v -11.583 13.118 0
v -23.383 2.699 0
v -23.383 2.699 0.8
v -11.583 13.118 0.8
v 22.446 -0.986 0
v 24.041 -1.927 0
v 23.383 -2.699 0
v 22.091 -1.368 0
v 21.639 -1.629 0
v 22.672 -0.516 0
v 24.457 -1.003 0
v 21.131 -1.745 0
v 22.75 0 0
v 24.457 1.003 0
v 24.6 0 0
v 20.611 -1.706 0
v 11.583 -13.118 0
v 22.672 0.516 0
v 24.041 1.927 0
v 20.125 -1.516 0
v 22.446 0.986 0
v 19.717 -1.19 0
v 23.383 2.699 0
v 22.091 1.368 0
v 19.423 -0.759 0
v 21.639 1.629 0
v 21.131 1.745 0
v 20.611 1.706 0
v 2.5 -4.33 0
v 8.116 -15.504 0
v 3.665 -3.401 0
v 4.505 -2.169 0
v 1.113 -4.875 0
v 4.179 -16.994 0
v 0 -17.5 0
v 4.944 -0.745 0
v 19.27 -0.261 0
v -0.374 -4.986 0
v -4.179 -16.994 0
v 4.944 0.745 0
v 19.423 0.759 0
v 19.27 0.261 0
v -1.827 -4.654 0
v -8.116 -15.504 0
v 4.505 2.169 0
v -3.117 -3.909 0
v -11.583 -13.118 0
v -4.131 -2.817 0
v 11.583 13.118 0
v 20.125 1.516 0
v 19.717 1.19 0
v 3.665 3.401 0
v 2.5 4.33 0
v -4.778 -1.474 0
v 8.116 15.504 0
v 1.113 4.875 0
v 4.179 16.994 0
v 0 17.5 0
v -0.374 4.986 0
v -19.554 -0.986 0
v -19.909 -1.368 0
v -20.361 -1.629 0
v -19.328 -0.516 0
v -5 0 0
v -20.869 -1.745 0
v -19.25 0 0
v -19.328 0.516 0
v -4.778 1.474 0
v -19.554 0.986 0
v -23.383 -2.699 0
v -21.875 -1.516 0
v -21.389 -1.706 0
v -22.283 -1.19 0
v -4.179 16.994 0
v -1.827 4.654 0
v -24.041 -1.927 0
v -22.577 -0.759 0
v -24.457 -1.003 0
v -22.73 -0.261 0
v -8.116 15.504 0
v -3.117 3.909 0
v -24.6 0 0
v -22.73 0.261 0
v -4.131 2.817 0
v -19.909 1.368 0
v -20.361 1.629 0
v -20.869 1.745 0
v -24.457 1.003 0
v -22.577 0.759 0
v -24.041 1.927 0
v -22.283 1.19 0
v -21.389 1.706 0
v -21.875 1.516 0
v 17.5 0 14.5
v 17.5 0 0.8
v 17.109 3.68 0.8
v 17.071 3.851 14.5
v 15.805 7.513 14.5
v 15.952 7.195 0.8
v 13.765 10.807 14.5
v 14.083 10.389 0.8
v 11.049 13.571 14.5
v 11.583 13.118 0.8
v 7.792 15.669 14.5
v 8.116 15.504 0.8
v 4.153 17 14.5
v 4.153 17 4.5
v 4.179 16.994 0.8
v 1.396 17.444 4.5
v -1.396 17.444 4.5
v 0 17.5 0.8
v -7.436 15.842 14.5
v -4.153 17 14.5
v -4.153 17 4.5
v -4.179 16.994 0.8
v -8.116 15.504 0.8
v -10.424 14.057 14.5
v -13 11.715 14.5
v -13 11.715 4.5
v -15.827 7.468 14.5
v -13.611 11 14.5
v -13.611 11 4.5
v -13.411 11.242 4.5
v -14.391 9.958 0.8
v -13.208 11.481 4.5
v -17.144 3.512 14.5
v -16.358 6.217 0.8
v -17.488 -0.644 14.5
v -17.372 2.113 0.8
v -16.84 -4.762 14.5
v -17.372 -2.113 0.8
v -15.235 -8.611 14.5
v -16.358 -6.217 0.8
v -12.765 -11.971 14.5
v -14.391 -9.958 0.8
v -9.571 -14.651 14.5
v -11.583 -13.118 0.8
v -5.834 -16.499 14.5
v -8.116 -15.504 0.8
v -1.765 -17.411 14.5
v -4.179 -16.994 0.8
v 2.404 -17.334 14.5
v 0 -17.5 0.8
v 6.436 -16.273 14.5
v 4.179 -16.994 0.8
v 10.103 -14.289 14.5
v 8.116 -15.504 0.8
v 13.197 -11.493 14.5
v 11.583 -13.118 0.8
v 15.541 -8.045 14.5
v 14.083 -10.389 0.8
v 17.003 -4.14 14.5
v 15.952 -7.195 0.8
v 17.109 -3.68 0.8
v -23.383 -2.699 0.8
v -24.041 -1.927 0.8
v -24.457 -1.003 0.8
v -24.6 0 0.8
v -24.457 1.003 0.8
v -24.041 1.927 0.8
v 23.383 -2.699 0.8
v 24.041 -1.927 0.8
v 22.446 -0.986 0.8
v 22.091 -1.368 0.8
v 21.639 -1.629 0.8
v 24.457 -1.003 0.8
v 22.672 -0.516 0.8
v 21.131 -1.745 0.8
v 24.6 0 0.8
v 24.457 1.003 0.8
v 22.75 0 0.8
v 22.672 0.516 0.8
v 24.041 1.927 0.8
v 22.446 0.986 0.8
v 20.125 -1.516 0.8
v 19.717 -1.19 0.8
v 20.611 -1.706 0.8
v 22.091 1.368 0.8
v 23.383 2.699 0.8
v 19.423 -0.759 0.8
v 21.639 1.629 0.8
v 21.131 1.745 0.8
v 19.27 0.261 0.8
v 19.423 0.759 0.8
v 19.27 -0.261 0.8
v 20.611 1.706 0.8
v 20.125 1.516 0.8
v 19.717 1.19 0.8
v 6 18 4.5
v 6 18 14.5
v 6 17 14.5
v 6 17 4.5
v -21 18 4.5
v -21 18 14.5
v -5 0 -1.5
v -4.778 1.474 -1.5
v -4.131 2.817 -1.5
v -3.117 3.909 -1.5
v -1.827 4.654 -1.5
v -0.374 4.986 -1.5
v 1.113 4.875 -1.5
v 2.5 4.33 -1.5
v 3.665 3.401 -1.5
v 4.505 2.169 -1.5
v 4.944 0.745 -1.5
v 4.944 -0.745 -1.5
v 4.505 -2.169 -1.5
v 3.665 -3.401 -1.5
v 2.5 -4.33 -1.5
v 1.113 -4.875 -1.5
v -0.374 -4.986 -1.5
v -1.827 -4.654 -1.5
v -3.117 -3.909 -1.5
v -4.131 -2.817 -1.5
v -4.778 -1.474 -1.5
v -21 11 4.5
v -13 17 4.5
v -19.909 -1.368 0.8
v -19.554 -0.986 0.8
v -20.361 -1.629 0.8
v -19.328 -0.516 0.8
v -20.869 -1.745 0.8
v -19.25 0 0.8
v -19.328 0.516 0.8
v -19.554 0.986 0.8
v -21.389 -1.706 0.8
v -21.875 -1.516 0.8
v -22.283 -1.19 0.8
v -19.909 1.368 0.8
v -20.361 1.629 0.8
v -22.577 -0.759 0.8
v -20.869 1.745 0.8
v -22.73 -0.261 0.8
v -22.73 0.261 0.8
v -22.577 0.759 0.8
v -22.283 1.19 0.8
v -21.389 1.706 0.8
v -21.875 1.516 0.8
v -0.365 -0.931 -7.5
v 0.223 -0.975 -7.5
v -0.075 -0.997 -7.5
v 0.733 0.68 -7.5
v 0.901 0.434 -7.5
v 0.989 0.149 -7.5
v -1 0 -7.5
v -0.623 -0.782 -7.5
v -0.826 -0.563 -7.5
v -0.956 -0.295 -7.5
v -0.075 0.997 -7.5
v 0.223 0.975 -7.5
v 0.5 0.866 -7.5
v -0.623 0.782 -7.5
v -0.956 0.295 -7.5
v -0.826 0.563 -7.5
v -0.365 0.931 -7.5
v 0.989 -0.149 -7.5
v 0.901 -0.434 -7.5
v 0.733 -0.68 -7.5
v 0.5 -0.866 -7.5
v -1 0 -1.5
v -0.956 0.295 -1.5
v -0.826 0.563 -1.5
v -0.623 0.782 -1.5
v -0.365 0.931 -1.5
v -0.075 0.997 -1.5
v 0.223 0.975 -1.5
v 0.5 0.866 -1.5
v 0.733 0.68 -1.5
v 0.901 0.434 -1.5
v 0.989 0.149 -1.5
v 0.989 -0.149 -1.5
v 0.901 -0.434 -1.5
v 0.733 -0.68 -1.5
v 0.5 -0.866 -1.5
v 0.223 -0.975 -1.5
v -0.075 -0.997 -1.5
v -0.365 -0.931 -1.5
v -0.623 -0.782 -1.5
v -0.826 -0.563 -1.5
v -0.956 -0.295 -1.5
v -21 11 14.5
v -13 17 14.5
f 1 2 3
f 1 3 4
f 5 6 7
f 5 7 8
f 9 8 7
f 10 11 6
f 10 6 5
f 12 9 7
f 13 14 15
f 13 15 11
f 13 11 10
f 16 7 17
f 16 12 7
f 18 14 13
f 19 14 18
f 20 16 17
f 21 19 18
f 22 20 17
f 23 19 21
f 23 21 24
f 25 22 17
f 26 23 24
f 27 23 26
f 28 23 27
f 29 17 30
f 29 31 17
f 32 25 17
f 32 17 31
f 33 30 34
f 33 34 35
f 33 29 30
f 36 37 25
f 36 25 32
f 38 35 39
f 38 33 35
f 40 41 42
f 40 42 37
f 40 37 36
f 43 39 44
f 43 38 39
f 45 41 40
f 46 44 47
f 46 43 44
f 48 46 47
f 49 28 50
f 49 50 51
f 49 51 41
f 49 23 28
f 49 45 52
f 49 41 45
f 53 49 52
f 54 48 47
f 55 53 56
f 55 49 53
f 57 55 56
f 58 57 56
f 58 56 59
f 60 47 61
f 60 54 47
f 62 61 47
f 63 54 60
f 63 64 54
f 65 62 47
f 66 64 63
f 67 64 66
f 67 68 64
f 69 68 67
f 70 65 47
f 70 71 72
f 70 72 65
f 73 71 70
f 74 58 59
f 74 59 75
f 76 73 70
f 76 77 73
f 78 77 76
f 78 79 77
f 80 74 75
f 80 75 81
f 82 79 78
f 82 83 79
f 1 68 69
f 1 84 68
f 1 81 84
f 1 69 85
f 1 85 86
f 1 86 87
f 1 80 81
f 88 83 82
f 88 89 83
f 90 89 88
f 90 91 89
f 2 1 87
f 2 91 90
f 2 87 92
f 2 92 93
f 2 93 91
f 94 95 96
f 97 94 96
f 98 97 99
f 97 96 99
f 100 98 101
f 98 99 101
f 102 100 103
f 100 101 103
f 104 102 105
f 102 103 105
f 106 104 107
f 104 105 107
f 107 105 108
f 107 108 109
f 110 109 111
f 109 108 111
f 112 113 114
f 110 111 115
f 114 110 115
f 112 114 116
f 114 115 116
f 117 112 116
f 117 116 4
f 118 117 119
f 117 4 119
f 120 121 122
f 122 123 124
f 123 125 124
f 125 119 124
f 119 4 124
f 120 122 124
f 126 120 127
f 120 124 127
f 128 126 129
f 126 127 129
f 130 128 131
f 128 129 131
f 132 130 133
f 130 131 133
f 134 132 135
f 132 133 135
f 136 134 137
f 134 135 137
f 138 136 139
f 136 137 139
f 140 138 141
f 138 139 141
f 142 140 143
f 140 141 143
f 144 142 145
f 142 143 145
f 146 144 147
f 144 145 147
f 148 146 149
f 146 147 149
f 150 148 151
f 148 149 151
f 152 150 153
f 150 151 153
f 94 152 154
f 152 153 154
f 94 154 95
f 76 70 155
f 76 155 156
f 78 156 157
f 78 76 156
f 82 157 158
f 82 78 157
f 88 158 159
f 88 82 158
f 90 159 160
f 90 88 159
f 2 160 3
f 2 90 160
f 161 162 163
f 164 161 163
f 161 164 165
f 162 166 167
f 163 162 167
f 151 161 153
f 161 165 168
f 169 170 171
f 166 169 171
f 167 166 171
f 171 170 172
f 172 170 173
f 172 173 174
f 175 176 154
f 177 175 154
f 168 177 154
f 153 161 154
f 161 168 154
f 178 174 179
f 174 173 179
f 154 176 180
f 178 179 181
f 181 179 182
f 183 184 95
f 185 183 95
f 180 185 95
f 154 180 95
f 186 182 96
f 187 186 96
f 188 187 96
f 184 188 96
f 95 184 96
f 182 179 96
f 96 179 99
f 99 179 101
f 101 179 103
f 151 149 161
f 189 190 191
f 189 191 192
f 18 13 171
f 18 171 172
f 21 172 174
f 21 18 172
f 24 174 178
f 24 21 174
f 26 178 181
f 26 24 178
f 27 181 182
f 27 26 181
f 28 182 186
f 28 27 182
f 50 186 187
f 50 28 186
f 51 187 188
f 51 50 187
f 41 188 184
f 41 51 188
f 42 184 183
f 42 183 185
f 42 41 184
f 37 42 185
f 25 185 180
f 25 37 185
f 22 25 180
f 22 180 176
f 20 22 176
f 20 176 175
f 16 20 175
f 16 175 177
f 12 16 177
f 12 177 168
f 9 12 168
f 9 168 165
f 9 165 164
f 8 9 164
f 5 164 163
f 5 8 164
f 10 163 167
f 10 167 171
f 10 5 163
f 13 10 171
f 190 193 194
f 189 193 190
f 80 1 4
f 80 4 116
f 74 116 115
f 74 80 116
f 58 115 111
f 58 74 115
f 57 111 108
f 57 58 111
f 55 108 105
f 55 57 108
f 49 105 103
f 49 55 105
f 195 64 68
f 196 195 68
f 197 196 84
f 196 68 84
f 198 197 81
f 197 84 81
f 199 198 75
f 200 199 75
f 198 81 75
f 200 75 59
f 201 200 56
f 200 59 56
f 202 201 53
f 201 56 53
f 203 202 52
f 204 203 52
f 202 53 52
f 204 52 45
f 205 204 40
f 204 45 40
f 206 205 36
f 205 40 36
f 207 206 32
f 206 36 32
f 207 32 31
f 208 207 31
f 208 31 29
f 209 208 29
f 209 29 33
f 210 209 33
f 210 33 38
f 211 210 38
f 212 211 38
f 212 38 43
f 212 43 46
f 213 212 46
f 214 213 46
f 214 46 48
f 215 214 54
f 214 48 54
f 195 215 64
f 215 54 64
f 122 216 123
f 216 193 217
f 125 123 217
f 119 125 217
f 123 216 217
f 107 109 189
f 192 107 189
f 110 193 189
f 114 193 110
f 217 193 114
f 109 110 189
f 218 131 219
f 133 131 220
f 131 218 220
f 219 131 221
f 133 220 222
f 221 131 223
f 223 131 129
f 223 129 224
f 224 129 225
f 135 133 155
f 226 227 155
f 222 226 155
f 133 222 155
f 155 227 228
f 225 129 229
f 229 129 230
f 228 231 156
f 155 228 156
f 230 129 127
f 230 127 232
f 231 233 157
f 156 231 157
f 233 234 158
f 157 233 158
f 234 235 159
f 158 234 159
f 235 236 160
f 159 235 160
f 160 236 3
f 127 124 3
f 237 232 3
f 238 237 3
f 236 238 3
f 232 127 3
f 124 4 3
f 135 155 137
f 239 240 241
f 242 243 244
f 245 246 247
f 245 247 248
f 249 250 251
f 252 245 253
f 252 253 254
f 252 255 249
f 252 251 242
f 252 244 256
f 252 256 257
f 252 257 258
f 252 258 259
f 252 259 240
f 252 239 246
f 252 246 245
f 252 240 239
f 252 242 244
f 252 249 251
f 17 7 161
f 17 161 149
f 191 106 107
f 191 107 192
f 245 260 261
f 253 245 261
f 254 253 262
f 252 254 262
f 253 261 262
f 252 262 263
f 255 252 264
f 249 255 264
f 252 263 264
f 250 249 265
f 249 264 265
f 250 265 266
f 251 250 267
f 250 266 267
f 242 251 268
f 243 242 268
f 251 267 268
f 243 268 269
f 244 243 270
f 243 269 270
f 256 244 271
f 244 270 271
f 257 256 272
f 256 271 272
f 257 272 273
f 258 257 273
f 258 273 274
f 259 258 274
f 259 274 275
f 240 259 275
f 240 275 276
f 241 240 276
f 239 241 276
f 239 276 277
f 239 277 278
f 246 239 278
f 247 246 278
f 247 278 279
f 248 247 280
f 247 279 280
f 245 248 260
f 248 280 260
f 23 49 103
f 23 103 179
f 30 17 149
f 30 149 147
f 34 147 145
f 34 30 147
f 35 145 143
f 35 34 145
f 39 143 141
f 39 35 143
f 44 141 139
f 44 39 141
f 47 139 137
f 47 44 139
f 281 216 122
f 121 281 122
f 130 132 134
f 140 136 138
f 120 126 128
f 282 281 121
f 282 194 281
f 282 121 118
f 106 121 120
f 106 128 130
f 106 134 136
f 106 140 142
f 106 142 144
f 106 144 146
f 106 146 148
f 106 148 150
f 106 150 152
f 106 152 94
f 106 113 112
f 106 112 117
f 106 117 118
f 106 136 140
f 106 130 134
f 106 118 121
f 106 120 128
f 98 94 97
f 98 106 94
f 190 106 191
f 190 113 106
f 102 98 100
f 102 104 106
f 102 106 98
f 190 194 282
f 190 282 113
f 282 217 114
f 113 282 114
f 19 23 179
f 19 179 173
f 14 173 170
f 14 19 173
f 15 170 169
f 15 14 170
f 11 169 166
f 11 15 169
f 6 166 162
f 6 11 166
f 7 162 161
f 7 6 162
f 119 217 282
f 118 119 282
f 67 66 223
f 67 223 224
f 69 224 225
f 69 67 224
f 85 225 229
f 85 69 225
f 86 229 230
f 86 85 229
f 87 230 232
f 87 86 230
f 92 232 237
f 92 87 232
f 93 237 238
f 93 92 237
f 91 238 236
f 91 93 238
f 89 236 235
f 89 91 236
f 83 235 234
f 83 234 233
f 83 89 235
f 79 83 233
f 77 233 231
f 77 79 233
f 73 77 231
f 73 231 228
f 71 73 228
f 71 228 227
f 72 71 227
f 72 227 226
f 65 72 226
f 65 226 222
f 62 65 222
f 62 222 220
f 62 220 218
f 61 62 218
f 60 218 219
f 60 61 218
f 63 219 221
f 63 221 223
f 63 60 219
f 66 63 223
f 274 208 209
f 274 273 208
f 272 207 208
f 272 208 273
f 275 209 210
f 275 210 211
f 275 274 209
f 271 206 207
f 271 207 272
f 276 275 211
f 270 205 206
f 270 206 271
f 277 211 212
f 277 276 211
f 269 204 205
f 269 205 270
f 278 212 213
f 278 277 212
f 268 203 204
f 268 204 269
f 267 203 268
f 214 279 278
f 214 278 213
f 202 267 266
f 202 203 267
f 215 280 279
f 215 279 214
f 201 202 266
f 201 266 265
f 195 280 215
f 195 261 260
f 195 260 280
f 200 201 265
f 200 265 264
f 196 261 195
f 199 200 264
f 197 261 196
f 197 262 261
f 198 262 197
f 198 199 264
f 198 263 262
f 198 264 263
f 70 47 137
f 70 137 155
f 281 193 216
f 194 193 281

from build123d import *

# Parameters (mm, degrees)
SKETCH_1_R           = 1.75
EXTRUDE_1_DEPTH      = 0.8
SKETCH_2_R           = 17.5
EXTRUDE_2_DEPTH      = 13.7
SKETCH_3_R           = 5
EXTRUDE_3_DEPTH      = 1.5
SKETCH_4_R           = 1
EXTRUDE_4_DEPTH      = 6
EXTRUDE_5_DEPTH      = 0.5
EXTRUDE_5_DEPTH_BACK = 0.5
SKETCH_6_W           = 27
SKETCH_6_H           = 10
SKETCH_7_W           = 8
SKETCH_7_H           = 10
EXTRUDE_6_DEPTH      = 6


with BuildPart() as part:
    # Эскиз1 → Бобышка-Вытянуть1 (new body)
    with BuildSketch(Plane.XY):
        with BuildLine():
            ThreePointArc((11.583333333, 13.117789024), (0, 17.5), (-11.583333333, 13.117789024))
            Line((-11.583333333, 13.117789024), (-23.382857143, 2.698516599))
            ThreePointArc((-23.382857143, 2.698516599), (-24.6, 0), (-23.382857143, -2.698516599))
            Line((-23.382857143, -2.698516599), (-11.583333333, -13.117789024))
            ThreePointArc((-11.583333333, -13.117789024), (0, -17.5), (11.583333333, -13.117789024))
            Line((11.583333333, -13.117789024), (23.382857143, -2.698516599))
            ThreePointArc((23.382857143, -2.698516599), (24.6, 0), (23.382857143, 2.698516599))
            Line((23.382857143, 2.698516599), (11.583333333, 13.117789024))
        make_face()
        with Locations((-21, 0)):
            Circle(SKETCH_1_R, mode=Mode.SUBTRACT)
        with Locations((21, 0)):
            Circle(SKETCH_1_R, mode=Mode.SUBTRACT)
    extrude(amount=EXTRUDE_1_DEPTH)

    # Эскиз2 → Бобышка-Вытянуть2 (add)
    with BuildSketch(Plane.XY.offset(0.8)):
        Circle(SKETCH_2_R)
    extrude(amount=EXTRUDE_2_DEPTH)

    # Эскиз3 → Бобышка-Вытянуть3 (add)
    with BuildSketch(Plane(origin=(0, 0, 0), x_dir=(-1, 0, 0), z_dir=(0, 0, -1))):
        Circle(SKETCH_3_R)
    extrude(amount=EXTRUDE_3_DEPTH)

    # Эскиз4 → Бобышка-Вытянуть4 (add)
    with BuildSketch(Plane(origin=(0, 0, -1.5), x_dir=(-1, 0, 0), z_dir=(0, 0, -1))):
        Circle(SKETCH_4_R)
    extrude(amount=EXTRUDE_4_DEPTH)



with BuildPart() as body_2:
    # Эскиз6 → Бобышка-Вытянуть5 (new, two sides: drawn at the far end of the back side and taken through both)
    with BuildSketch(Plane(origin=(0, 17.5, 0), x_dir=(1, 0, 0), z_dir=(0, 1, 0)).offset(-EXTRUDE_5_DEPTH_BACK)):
        with Locations((-7.5, -9.5)):
            Rectangle(SKETCH_6_W, SKETCH_6_H)
    extrude(amount=EXTRUDE_5_DEPTH + EXTRUDE_5_DEPTH_BACK)


with BuildPart() as part_1:
    add(part.part)

    add(body_2.part)  # Бобышка-Вытянуть6 merges body 2
    # Эскиз7 → Бобышка-Вытянуть6 (add)
    with BuildSketch(Plane.XZ.offset(-17)):
        with Locations((-17, 9.5)):
            Rectangle(SKETCH_7_W, SKETCH_7_H)
    extrude(amount=EXTRUDE_6_DEPTH)


solid = part_1.part
